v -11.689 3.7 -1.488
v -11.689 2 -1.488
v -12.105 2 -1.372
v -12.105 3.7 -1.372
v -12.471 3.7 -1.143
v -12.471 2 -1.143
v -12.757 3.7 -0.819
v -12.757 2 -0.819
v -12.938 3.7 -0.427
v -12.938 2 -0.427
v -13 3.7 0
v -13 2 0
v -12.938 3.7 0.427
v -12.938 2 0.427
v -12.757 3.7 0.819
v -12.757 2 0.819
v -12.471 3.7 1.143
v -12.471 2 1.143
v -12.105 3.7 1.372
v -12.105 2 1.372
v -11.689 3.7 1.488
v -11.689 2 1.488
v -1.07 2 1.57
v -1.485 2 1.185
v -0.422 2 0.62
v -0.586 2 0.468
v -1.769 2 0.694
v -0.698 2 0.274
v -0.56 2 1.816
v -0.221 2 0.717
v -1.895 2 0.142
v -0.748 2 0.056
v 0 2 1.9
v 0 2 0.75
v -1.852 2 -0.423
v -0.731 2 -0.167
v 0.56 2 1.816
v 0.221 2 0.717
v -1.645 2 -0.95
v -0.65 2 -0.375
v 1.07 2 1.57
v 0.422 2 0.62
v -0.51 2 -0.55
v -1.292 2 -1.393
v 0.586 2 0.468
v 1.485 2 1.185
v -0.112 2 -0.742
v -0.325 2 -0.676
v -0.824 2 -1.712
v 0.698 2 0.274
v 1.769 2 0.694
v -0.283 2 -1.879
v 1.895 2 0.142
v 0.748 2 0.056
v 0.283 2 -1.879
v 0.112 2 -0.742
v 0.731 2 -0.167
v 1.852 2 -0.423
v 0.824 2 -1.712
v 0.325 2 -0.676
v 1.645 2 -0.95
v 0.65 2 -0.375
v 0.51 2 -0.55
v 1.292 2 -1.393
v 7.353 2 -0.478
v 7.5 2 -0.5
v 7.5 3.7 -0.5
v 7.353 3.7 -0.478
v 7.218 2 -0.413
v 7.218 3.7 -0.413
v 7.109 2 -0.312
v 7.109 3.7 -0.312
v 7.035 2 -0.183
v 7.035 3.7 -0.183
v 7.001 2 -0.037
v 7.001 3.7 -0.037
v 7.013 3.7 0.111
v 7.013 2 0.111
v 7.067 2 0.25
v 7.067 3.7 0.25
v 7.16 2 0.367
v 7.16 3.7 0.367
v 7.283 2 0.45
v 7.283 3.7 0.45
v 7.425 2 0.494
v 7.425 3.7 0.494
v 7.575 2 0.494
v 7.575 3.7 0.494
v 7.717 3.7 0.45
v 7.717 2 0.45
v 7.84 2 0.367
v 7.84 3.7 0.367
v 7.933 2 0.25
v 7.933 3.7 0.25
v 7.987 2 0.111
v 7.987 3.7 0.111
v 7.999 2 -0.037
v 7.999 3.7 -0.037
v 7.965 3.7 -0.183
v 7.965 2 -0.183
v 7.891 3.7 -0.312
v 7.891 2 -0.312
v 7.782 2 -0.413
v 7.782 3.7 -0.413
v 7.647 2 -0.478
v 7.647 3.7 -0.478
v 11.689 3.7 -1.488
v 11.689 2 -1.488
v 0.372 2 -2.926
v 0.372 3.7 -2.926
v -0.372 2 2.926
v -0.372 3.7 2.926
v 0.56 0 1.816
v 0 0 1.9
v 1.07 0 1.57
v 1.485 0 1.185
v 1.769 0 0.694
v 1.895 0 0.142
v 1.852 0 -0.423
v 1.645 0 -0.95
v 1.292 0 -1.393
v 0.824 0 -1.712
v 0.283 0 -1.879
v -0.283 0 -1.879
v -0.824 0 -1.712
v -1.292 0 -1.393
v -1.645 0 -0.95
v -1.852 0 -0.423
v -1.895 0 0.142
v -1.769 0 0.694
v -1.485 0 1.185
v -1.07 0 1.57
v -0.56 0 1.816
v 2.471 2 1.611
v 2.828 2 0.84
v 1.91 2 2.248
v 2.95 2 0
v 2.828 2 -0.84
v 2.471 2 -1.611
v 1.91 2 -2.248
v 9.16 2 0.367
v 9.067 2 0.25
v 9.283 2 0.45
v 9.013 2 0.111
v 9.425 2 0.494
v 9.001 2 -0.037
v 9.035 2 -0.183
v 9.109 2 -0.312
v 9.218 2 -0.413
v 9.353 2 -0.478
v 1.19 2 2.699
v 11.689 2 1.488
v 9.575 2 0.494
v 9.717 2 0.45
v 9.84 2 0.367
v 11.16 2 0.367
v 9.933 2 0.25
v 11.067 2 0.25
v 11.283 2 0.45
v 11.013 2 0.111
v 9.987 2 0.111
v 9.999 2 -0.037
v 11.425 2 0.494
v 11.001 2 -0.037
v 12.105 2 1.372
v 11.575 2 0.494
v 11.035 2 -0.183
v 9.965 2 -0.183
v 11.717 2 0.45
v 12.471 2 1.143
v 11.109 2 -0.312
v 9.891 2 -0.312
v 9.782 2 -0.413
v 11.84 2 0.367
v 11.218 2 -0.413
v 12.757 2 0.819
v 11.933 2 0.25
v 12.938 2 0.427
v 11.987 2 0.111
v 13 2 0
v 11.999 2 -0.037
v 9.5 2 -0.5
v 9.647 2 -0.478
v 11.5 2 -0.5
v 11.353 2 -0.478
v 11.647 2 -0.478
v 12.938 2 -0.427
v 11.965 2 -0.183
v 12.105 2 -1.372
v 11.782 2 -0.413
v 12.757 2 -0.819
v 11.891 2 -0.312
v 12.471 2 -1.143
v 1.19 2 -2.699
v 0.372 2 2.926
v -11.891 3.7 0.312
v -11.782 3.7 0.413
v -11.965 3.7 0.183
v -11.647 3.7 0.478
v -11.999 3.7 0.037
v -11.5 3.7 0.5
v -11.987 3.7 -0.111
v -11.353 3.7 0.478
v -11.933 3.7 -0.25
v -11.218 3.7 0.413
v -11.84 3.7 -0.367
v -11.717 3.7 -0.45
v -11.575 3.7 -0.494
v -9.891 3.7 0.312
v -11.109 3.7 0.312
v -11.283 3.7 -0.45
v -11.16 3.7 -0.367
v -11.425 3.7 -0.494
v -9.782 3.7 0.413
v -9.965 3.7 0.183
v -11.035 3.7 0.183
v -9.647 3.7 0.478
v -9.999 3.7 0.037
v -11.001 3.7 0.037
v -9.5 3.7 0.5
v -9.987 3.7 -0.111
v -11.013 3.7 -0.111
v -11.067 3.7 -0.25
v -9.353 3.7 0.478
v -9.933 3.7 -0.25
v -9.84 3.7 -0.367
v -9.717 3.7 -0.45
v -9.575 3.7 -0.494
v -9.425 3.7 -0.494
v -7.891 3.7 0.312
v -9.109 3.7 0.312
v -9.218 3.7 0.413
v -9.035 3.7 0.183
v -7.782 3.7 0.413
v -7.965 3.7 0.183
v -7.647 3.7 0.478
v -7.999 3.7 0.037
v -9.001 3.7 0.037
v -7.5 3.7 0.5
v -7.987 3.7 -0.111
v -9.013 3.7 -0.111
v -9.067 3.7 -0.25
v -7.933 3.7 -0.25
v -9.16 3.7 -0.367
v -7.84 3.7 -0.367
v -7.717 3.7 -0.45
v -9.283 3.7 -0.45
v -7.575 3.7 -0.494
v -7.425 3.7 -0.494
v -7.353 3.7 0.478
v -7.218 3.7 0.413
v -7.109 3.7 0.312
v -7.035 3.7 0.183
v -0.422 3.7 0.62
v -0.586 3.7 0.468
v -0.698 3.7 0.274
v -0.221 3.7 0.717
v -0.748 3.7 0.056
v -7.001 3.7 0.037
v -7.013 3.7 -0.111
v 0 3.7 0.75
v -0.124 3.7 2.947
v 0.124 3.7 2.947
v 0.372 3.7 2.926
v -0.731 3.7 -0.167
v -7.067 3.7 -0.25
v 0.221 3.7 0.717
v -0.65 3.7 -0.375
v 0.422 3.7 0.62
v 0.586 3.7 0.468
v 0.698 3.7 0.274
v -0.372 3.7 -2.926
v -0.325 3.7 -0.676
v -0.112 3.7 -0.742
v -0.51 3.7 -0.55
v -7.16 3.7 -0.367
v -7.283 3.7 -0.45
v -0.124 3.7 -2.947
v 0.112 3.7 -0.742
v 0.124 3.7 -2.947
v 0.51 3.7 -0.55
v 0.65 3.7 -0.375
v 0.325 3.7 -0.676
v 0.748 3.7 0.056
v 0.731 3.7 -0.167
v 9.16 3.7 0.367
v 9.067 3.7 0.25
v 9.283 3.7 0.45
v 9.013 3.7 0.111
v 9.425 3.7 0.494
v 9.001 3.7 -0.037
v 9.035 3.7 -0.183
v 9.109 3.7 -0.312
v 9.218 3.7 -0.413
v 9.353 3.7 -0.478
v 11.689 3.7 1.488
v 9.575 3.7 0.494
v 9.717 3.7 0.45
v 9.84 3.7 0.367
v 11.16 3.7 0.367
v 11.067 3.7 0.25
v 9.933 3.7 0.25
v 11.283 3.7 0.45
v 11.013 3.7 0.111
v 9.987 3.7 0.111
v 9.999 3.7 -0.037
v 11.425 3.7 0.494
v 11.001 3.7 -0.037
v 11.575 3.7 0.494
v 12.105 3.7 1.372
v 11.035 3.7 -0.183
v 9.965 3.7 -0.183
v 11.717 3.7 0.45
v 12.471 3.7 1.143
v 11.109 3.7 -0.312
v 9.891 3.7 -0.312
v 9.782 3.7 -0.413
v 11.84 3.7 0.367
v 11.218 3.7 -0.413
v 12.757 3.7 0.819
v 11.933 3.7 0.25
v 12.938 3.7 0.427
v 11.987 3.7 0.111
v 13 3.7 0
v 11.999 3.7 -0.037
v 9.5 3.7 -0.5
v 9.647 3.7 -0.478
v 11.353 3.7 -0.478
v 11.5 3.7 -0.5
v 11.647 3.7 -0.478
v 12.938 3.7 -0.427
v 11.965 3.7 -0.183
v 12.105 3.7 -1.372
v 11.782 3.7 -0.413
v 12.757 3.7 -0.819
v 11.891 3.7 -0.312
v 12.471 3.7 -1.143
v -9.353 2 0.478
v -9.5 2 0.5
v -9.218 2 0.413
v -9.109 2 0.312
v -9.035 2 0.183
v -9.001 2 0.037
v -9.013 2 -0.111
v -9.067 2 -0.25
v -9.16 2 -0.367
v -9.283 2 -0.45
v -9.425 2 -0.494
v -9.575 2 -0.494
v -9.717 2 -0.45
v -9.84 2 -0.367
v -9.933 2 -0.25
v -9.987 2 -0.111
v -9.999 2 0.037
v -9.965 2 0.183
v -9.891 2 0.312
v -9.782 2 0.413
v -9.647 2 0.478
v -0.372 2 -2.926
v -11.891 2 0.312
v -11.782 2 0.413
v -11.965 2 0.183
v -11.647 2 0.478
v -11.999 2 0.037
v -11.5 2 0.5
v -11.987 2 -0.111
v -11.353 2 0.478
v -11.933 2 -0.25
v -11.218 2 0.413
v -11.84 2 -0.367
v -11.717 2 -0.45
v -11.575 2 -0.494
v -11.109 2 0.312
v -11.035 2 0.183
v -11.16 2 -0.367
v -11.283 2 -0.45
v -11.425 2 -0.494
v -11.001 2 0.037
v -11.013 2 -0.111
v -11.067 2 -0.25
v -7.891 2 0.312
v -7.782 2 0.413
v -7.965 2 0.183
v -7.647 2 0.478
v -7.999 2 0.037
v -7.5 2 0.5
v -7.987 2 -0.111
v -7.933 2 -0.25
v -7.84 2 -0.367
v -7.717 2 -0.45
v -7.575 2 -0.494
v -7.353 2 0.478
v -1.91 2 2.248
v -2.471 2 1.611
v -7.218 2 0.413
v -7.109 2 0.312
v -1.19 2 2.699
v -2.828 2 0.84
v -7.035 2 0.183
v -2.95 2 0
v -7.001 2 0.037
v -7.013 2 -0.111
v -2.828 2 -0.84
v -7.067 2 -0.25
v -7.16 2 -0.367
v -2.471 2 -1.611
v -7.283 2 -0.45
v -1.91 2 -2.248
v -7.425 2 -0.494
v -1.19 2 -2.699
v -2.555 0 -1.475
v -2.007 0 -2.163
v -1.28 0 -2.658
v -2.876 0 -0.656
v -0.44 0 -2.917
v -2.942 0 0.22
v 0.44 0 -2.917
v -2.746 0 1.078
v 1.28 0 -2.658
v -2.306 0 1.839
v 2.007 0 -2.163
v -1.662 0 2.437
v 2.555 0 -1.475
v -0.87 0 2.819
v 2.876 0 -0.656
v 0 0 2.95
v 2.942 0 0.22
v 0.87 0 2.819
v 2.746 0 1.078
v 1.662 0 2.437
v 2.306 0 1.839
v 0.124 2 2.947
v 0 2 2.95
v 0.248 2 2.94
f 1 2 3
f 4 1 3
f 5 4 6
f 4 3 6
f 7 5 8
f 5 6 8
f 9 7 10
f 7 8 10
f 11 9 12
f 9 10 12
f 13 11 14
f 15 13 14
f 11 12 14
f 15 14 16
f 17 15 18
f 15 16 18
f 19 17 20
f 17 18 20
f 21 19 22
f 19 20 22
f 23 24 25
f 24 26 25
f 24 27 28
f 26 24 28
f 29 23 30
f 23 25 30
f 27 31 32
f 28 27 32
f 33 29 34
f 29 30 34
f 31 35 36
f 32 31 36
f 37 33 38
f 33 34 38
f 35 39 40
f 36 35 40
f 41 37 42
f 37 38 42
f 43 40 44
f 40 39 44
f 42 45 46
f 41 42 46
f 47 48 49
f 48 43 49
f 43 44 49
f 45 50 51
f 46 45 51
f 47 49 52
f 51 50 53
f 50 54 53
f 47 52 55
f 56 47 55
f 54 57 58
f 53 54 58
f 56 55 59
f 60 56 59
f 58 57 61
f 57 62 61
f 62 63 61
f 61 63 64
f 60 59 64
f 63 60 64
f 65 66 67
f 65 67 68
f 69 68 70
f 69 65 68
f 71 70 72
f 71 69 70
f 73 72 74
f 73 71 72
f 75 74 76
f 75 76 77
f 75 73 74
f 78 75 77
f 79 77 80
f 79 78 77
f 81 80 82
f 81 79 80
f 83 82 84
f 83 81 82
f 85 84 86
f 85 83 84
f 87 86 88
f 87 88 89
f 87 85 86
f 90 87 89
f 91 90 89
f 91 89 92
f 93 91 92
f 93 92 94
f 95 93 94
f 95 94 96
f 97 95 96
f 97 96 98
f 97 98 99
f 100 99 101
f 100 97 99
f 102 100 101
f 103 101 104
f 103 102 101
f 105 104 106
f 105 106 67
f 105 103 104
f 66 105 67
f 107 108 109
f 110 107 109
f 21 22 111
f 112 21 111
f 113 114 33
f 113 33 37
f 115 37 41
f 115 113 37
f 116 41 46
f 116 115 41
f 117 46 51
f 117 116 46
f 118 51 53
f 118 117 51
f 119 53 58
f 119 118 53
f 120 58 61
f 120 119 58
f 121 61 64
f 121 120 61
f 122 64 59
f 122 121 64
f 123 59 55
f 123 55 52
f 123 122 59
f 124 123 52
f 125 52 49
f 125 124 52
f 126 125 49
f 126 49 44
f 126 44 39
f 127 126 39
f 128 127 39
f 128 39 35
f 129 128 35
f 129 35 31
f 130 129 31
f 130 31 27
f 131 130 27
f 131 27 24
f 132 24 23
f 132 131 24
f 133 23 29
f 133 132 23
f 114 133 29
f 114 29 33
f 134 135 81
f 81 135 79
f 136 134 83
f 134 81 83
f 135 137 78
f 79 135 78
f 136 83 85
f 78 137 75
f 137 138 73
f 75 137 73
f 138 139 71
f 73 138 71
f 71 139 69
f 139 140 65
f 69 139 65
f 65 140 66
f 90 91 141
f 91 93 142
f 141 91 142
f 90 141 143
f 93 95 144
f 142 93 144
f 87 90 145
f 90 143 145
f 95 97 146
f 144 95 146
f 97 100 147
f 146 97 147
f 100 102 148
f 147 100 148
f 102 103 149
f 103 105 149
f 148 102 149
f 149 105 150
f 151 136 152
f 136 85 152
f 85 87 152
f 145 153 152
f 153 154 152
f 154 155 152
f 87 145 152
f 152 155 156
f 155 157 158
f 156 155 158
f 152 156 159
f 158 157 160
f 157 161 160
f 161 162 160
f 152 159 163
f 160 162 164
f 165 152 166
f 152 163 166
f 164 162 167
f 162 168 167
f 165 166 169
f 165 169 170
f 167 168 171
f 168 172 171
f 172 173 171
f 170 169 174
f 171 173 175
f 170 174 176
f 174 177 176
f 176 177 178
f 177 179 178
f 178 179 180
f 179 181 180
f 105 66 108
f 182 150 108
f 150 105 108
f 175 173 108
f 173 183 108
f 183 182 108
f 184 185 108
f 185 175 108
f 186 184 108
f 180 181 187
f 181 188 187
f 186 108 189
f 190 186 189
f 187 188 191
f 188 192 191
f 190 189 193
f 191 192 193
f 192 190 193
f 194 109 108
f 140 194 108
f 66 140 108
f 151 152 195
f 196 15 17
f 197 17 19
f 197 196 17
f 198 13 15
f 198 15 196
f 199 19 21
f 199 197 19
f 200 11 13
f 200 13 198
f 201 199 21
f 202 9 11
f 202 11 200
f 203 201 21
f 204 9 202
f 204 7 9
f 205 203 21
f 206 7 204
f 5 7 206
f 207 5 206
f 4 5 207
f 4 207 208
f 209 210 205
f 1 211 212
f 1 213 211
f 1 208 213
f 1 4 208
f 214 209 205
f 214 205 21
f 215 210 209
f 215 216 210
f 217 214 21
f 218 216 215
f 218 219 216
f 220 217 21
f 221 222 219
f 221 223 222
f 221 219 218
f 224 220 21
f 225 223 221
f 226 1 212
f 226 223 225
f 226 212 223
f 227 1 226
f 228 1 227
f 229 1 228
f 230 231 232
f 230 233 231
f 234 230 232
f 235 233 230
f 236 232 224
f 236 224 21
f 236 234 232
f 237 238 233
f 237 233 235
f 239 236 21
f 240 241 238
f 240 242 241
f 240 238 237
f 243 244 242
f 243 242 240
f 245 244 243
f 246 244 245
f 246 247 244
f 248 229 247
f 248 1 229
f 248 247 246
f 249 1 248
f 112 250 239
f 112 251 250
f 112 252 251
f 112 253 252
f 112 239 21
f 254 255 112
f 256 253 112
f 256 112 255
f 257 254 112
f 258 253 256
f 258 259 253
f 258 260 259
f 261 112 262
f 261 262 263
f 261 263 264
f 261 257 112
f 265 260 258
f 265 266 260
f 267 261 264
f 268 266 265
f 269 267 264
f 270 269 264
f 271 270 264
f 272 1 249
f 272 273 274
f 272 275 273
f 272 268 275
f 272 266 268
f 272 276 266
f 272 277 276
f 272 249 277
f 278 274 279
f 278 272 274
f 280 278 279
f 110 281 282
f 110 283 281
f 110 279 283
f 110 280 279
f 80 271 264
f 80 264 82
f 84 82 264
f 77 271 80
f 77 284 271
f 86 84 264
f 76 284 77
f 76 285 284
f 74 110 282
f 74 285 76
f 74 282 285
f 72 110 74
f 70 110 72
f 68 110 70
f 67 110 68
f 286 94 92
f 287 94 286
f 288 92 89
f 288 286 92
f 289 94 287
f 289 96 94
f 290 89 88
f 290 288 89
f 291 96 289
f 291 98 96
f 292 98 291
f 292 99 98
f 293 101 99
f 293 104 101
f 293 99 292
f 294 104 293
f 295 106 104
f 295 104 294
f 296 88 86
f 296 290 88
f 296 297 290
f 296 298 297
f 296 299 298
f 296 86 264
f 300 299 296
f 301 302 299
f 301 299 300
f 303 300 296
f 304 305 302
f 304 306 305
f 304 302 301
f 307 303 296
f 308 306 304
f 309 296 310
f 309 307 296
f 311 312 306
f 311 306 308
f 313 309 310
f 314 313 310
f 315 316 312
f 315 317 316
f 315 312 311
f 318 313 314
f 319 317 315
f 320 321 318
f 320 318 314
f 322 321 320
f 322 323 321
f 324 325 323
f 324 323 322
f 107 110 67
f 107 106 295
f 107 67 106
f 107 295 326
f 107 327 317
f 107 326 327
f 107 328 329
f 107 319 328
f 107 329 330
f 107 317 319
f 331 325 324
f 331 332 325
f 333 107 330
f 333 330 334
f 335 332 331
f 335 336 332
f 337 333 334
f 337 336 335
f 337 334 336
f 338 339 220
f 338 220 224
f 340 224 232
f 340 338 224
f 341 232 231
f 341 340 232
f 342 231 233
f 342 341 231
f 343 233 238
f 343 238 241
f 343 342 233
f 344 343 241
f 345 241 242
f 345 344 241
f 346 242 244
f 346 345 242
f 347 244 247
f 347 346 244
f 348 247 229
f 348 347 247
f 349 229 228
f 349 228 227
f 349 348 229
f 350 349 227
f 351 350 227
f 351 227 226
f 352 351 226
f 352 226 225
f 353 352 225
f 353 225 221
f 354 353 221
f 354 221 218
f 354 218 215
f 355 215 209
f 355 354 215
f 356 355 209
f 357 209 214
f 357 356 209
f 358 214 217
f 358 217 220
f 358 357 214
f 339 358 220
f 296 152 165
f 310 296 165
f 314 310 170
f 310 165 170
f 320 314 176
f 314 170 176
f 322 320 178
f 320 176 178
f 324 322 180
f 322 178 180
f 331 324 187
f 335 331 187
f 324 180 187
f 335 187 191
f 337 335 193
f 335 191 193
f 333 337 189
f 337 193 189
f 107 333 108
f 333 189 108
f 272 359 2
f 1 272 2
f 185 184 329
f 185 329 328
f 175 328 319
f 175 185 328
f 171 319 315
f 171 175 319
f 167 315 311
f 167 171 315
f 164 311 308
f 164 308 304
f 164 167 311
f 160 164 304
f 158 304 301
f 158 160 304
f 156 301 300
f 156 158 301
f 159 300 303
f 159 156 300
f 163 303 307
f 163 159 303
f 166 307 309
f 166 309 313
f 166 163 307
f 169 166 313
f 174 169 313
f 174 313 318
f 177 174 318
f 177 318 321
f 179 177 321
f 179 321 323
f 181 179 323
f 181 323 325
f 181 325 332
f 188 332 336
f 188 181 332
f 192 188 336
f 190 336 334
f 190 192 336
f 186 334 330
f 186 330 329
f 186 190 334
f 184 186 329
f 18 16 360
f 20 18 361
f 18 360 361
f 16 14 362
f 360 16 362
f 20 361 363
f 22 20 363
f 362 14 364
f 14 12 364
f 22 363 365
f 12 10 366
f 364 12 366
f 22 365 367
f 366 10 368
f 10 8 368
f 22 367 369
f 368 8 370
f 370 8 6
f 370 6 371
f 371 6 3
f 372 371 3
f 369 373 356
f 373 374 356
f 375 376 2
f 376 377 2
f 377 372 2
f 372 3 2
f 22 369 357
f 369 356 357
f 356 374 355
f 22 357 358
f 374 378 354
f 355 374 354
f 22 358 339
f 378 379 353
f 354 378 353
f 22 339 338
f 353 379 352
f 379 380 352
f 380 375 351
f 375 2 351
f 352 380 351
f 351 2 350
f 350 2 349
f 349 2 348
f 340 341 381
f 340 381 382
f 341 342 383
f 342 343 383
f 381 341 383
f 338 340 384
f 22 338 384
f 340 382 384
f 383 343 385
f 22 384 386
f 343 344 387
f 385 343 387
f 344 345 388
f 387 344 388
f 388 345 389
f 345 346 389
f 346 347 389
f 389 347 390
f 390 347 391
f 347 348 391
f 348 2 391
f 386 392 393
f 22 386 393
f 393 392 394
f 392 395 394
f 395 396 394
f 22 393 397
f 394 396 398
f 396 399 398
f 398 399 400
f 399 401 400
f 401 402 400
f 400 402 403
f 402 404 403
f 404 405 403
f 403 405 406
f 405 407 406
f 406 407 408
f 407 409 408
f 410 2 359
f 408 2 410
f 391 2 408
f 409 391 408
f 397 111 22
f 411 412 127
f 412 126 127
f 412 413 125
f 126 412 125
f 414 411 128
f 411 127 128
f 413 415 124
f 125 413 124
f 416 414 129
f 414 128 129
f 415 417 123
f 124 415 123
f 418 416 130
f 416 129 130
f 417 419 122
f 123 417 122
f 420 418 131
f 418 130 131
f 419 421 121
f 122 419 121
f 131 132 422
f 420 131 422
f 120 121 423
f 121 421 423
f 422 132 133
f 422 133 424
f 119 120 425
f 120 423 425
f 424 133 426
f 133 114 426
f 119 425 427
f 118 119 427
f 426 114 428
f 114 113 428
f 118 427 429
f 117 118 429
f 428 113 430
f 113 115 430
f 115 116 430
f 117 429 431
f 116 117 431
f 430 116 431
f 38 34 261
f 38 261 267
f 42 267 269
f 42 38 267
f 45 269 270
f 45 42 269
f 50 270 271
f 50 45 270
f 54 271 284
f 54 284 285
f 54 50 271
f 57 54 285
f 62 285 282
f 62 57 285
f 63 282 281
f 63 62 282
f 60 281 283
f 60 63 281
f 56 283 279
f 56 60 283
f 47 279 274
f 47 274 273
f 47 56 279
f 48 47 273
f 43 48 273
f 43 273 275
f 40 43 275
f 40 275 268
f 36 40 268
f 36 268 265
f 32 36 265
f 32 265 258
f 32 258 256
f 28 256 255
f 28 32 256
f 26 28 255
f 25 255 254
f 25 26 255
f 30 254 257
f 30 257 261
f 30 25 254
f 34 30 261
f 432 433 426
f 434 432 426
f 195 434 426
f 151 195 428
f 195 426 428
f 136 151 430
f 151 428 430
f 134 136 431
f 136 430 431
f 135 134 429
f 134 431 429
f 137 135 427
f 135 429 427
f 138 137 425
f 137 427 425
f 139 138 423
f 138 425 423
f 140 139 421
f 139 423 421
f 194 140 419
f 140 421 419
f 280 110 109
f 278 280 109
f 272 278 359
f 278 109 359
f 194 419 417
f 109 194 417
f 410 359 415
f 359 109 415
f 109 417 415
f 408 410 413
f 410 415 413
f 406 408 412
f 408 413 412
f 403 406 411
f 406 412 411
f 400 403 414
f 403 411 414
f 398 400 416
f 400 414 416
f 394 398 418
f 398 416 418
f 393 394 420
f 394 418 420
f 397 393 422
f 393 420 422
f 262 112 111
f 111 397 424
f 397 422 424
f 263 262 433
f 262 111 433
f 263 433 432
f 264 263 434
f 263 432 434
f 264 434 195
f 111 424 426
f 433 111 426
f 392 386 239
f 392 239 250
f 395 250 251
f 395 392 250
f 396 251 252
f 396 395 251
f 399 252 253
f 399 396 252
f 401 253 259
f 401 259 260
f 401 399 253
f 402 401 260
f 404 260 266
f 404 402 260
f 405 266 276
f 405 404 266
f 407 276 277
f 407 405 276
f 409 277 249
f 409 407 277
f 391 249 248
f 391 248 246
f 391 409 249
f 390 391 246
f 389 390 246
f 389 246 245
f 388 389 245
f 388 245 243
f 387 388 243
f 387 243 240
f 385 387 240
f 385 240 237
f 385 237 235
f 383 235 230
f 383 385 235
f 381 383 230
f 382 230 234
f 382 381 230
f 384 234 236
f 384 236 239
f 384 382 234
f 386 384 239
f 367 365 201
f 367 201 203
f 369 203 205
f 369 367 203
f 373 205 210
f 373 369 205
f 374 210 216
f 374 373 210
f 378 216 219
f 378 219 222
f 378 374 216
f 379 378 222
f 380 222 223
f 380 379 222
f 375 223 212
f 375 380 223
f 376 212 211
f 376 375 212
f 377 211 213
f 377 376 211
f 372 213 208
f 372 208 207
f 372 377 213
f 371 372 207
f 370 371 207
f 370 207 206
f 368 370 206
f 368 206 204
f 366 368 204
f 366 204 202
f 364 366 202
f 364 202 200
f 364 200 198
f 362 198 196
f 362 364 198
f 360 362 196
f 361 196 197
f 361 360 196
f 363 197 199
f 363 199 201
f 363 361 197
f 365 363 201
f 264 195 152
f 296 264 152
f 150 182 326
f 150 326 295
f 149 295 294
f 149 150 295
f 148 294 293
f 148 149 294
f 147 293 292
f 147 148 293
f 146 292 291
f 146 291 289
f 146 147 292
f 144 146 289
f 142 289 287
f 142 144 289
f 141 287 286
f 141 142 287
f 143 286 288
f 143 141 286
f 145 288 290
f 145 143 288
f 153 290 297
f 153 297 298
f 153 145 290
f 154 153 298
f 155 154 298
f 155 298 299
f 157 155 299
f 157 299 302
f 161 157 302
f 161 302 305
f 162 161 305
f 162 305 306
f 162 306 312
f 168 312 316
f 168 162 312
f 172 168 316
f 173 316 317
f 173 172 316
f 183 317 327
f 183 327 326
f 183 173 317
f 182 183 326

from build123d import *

# Parameters (mm, degrees)
SKETCH1_R           = 2.95
SKETCH1_R_2         = 1.9
BOSS_EXTRUDE1_DEPTH = 2
SKETCH2_R           = 0.5000000000000008
SKETCH2_R_2         = 0.75
BOSS_EXTRUDE2_DEPTH = 1.7


with BuildPart() as part:
    # Sketch1 → Boss-Extrude1 (new body)
    with BuildSketch(Plane(origin=(0, 0, 0), x_dir=(1, 0, 0), z_dir=(0, 1, 0))):
        with Locations(Location((0, 0, 0), (0, 0, 270))):
            Circle(SKETCH1_R)
        with Locations(Location((0, 0, 0), (0, 0, 270))):
            Circle(SKETCH1_R_2, mode=Mode.SUBTRACT)
    extrude(amount=BOSS_EXTRUDE1_DEPTH)

    # Sketch2 → Boss-Extrude2 (add)
    with BuildSketch(Plane(origin=(0, 2, 0), x_dir=(1, 0, 0), z_dir=(0, 1, 0))):
        with BuildLine():
            Line((-0.3719565217391307, 2.9264566195205663), (-11.689130434782609, 1.488028789586728))
            ThreePointArc((-11.689130434782609, 1.488028789586728), (-13, 1.8e-16), (-11.689130434782609, -1.488028789586728))
            Line((-11.689130434782609, -1.488028789586728), (-0.3719565217391307, -2.9264566195205663))
            ThreePointArc((-0.3719565217391307, -2.9264566195205663), (1.8e-16, -2.9500000000000024), (0.3719565217391307, -2.9264566195205663))
            Line((0.3719565217391307, -2.9264566195205663), (11.689130434782609, -1.488028789586728))
            ThreePointArc((11.689130434782609, -1.488028789586728), (13, 0), (11.689130434782609, 1.488028789586728))
            Line((11.689130434782609, 1.488028789586728), (0.3719565217391307, 2.9264566195205663))
            ThreePointArc((0.3719565217391307, 2.9264566195205663), (1.8e-16, 2.9500000000000024), (-0.3719565217391307, 2.9264566195205663))
        make_face()
        with Locations(Location((-11.5, 0, 0), (0, 0, 270))):
            Circle(SKETCH2_R, mode=Mode.SUBTRACT)
        with Locations(Location((-9.5, 0, 0), (0, 0, 270))):
            Circle(SKETCH2_R, mode=Mode.SUBTRACT)
        with Locations(Location((-7.5, 0, 0), (0, 0, 270))):
            Circle(SKETCH2_R, mode=Mode.SUBTRACT)
        with Locations(Location((7.5, 0, 0), (0, 0, 90))):
            Circle(SKETCH2_R, mode=Mode.SUBTRACT)
        with Locations(Location((9.5, 0, 0), (0, 0, 90))):
            Circle(SKETCH2_R, mode=Mode.SUBTRACT)
        with Locations(Location((11.5, 0, 0), (0, 0, 90))):
            Circle(SKETCH2_R, mode=Mode.SUBTRACT)
        with Locations(Location((0, 0, 0), (0, 0, 270))):
            Circle(SKETCH2_R_2, mode=Mode.SUBTRACT)
    extrude(amount=BOSS_EXTRUDE2_DEPTH)


solid = part.part
